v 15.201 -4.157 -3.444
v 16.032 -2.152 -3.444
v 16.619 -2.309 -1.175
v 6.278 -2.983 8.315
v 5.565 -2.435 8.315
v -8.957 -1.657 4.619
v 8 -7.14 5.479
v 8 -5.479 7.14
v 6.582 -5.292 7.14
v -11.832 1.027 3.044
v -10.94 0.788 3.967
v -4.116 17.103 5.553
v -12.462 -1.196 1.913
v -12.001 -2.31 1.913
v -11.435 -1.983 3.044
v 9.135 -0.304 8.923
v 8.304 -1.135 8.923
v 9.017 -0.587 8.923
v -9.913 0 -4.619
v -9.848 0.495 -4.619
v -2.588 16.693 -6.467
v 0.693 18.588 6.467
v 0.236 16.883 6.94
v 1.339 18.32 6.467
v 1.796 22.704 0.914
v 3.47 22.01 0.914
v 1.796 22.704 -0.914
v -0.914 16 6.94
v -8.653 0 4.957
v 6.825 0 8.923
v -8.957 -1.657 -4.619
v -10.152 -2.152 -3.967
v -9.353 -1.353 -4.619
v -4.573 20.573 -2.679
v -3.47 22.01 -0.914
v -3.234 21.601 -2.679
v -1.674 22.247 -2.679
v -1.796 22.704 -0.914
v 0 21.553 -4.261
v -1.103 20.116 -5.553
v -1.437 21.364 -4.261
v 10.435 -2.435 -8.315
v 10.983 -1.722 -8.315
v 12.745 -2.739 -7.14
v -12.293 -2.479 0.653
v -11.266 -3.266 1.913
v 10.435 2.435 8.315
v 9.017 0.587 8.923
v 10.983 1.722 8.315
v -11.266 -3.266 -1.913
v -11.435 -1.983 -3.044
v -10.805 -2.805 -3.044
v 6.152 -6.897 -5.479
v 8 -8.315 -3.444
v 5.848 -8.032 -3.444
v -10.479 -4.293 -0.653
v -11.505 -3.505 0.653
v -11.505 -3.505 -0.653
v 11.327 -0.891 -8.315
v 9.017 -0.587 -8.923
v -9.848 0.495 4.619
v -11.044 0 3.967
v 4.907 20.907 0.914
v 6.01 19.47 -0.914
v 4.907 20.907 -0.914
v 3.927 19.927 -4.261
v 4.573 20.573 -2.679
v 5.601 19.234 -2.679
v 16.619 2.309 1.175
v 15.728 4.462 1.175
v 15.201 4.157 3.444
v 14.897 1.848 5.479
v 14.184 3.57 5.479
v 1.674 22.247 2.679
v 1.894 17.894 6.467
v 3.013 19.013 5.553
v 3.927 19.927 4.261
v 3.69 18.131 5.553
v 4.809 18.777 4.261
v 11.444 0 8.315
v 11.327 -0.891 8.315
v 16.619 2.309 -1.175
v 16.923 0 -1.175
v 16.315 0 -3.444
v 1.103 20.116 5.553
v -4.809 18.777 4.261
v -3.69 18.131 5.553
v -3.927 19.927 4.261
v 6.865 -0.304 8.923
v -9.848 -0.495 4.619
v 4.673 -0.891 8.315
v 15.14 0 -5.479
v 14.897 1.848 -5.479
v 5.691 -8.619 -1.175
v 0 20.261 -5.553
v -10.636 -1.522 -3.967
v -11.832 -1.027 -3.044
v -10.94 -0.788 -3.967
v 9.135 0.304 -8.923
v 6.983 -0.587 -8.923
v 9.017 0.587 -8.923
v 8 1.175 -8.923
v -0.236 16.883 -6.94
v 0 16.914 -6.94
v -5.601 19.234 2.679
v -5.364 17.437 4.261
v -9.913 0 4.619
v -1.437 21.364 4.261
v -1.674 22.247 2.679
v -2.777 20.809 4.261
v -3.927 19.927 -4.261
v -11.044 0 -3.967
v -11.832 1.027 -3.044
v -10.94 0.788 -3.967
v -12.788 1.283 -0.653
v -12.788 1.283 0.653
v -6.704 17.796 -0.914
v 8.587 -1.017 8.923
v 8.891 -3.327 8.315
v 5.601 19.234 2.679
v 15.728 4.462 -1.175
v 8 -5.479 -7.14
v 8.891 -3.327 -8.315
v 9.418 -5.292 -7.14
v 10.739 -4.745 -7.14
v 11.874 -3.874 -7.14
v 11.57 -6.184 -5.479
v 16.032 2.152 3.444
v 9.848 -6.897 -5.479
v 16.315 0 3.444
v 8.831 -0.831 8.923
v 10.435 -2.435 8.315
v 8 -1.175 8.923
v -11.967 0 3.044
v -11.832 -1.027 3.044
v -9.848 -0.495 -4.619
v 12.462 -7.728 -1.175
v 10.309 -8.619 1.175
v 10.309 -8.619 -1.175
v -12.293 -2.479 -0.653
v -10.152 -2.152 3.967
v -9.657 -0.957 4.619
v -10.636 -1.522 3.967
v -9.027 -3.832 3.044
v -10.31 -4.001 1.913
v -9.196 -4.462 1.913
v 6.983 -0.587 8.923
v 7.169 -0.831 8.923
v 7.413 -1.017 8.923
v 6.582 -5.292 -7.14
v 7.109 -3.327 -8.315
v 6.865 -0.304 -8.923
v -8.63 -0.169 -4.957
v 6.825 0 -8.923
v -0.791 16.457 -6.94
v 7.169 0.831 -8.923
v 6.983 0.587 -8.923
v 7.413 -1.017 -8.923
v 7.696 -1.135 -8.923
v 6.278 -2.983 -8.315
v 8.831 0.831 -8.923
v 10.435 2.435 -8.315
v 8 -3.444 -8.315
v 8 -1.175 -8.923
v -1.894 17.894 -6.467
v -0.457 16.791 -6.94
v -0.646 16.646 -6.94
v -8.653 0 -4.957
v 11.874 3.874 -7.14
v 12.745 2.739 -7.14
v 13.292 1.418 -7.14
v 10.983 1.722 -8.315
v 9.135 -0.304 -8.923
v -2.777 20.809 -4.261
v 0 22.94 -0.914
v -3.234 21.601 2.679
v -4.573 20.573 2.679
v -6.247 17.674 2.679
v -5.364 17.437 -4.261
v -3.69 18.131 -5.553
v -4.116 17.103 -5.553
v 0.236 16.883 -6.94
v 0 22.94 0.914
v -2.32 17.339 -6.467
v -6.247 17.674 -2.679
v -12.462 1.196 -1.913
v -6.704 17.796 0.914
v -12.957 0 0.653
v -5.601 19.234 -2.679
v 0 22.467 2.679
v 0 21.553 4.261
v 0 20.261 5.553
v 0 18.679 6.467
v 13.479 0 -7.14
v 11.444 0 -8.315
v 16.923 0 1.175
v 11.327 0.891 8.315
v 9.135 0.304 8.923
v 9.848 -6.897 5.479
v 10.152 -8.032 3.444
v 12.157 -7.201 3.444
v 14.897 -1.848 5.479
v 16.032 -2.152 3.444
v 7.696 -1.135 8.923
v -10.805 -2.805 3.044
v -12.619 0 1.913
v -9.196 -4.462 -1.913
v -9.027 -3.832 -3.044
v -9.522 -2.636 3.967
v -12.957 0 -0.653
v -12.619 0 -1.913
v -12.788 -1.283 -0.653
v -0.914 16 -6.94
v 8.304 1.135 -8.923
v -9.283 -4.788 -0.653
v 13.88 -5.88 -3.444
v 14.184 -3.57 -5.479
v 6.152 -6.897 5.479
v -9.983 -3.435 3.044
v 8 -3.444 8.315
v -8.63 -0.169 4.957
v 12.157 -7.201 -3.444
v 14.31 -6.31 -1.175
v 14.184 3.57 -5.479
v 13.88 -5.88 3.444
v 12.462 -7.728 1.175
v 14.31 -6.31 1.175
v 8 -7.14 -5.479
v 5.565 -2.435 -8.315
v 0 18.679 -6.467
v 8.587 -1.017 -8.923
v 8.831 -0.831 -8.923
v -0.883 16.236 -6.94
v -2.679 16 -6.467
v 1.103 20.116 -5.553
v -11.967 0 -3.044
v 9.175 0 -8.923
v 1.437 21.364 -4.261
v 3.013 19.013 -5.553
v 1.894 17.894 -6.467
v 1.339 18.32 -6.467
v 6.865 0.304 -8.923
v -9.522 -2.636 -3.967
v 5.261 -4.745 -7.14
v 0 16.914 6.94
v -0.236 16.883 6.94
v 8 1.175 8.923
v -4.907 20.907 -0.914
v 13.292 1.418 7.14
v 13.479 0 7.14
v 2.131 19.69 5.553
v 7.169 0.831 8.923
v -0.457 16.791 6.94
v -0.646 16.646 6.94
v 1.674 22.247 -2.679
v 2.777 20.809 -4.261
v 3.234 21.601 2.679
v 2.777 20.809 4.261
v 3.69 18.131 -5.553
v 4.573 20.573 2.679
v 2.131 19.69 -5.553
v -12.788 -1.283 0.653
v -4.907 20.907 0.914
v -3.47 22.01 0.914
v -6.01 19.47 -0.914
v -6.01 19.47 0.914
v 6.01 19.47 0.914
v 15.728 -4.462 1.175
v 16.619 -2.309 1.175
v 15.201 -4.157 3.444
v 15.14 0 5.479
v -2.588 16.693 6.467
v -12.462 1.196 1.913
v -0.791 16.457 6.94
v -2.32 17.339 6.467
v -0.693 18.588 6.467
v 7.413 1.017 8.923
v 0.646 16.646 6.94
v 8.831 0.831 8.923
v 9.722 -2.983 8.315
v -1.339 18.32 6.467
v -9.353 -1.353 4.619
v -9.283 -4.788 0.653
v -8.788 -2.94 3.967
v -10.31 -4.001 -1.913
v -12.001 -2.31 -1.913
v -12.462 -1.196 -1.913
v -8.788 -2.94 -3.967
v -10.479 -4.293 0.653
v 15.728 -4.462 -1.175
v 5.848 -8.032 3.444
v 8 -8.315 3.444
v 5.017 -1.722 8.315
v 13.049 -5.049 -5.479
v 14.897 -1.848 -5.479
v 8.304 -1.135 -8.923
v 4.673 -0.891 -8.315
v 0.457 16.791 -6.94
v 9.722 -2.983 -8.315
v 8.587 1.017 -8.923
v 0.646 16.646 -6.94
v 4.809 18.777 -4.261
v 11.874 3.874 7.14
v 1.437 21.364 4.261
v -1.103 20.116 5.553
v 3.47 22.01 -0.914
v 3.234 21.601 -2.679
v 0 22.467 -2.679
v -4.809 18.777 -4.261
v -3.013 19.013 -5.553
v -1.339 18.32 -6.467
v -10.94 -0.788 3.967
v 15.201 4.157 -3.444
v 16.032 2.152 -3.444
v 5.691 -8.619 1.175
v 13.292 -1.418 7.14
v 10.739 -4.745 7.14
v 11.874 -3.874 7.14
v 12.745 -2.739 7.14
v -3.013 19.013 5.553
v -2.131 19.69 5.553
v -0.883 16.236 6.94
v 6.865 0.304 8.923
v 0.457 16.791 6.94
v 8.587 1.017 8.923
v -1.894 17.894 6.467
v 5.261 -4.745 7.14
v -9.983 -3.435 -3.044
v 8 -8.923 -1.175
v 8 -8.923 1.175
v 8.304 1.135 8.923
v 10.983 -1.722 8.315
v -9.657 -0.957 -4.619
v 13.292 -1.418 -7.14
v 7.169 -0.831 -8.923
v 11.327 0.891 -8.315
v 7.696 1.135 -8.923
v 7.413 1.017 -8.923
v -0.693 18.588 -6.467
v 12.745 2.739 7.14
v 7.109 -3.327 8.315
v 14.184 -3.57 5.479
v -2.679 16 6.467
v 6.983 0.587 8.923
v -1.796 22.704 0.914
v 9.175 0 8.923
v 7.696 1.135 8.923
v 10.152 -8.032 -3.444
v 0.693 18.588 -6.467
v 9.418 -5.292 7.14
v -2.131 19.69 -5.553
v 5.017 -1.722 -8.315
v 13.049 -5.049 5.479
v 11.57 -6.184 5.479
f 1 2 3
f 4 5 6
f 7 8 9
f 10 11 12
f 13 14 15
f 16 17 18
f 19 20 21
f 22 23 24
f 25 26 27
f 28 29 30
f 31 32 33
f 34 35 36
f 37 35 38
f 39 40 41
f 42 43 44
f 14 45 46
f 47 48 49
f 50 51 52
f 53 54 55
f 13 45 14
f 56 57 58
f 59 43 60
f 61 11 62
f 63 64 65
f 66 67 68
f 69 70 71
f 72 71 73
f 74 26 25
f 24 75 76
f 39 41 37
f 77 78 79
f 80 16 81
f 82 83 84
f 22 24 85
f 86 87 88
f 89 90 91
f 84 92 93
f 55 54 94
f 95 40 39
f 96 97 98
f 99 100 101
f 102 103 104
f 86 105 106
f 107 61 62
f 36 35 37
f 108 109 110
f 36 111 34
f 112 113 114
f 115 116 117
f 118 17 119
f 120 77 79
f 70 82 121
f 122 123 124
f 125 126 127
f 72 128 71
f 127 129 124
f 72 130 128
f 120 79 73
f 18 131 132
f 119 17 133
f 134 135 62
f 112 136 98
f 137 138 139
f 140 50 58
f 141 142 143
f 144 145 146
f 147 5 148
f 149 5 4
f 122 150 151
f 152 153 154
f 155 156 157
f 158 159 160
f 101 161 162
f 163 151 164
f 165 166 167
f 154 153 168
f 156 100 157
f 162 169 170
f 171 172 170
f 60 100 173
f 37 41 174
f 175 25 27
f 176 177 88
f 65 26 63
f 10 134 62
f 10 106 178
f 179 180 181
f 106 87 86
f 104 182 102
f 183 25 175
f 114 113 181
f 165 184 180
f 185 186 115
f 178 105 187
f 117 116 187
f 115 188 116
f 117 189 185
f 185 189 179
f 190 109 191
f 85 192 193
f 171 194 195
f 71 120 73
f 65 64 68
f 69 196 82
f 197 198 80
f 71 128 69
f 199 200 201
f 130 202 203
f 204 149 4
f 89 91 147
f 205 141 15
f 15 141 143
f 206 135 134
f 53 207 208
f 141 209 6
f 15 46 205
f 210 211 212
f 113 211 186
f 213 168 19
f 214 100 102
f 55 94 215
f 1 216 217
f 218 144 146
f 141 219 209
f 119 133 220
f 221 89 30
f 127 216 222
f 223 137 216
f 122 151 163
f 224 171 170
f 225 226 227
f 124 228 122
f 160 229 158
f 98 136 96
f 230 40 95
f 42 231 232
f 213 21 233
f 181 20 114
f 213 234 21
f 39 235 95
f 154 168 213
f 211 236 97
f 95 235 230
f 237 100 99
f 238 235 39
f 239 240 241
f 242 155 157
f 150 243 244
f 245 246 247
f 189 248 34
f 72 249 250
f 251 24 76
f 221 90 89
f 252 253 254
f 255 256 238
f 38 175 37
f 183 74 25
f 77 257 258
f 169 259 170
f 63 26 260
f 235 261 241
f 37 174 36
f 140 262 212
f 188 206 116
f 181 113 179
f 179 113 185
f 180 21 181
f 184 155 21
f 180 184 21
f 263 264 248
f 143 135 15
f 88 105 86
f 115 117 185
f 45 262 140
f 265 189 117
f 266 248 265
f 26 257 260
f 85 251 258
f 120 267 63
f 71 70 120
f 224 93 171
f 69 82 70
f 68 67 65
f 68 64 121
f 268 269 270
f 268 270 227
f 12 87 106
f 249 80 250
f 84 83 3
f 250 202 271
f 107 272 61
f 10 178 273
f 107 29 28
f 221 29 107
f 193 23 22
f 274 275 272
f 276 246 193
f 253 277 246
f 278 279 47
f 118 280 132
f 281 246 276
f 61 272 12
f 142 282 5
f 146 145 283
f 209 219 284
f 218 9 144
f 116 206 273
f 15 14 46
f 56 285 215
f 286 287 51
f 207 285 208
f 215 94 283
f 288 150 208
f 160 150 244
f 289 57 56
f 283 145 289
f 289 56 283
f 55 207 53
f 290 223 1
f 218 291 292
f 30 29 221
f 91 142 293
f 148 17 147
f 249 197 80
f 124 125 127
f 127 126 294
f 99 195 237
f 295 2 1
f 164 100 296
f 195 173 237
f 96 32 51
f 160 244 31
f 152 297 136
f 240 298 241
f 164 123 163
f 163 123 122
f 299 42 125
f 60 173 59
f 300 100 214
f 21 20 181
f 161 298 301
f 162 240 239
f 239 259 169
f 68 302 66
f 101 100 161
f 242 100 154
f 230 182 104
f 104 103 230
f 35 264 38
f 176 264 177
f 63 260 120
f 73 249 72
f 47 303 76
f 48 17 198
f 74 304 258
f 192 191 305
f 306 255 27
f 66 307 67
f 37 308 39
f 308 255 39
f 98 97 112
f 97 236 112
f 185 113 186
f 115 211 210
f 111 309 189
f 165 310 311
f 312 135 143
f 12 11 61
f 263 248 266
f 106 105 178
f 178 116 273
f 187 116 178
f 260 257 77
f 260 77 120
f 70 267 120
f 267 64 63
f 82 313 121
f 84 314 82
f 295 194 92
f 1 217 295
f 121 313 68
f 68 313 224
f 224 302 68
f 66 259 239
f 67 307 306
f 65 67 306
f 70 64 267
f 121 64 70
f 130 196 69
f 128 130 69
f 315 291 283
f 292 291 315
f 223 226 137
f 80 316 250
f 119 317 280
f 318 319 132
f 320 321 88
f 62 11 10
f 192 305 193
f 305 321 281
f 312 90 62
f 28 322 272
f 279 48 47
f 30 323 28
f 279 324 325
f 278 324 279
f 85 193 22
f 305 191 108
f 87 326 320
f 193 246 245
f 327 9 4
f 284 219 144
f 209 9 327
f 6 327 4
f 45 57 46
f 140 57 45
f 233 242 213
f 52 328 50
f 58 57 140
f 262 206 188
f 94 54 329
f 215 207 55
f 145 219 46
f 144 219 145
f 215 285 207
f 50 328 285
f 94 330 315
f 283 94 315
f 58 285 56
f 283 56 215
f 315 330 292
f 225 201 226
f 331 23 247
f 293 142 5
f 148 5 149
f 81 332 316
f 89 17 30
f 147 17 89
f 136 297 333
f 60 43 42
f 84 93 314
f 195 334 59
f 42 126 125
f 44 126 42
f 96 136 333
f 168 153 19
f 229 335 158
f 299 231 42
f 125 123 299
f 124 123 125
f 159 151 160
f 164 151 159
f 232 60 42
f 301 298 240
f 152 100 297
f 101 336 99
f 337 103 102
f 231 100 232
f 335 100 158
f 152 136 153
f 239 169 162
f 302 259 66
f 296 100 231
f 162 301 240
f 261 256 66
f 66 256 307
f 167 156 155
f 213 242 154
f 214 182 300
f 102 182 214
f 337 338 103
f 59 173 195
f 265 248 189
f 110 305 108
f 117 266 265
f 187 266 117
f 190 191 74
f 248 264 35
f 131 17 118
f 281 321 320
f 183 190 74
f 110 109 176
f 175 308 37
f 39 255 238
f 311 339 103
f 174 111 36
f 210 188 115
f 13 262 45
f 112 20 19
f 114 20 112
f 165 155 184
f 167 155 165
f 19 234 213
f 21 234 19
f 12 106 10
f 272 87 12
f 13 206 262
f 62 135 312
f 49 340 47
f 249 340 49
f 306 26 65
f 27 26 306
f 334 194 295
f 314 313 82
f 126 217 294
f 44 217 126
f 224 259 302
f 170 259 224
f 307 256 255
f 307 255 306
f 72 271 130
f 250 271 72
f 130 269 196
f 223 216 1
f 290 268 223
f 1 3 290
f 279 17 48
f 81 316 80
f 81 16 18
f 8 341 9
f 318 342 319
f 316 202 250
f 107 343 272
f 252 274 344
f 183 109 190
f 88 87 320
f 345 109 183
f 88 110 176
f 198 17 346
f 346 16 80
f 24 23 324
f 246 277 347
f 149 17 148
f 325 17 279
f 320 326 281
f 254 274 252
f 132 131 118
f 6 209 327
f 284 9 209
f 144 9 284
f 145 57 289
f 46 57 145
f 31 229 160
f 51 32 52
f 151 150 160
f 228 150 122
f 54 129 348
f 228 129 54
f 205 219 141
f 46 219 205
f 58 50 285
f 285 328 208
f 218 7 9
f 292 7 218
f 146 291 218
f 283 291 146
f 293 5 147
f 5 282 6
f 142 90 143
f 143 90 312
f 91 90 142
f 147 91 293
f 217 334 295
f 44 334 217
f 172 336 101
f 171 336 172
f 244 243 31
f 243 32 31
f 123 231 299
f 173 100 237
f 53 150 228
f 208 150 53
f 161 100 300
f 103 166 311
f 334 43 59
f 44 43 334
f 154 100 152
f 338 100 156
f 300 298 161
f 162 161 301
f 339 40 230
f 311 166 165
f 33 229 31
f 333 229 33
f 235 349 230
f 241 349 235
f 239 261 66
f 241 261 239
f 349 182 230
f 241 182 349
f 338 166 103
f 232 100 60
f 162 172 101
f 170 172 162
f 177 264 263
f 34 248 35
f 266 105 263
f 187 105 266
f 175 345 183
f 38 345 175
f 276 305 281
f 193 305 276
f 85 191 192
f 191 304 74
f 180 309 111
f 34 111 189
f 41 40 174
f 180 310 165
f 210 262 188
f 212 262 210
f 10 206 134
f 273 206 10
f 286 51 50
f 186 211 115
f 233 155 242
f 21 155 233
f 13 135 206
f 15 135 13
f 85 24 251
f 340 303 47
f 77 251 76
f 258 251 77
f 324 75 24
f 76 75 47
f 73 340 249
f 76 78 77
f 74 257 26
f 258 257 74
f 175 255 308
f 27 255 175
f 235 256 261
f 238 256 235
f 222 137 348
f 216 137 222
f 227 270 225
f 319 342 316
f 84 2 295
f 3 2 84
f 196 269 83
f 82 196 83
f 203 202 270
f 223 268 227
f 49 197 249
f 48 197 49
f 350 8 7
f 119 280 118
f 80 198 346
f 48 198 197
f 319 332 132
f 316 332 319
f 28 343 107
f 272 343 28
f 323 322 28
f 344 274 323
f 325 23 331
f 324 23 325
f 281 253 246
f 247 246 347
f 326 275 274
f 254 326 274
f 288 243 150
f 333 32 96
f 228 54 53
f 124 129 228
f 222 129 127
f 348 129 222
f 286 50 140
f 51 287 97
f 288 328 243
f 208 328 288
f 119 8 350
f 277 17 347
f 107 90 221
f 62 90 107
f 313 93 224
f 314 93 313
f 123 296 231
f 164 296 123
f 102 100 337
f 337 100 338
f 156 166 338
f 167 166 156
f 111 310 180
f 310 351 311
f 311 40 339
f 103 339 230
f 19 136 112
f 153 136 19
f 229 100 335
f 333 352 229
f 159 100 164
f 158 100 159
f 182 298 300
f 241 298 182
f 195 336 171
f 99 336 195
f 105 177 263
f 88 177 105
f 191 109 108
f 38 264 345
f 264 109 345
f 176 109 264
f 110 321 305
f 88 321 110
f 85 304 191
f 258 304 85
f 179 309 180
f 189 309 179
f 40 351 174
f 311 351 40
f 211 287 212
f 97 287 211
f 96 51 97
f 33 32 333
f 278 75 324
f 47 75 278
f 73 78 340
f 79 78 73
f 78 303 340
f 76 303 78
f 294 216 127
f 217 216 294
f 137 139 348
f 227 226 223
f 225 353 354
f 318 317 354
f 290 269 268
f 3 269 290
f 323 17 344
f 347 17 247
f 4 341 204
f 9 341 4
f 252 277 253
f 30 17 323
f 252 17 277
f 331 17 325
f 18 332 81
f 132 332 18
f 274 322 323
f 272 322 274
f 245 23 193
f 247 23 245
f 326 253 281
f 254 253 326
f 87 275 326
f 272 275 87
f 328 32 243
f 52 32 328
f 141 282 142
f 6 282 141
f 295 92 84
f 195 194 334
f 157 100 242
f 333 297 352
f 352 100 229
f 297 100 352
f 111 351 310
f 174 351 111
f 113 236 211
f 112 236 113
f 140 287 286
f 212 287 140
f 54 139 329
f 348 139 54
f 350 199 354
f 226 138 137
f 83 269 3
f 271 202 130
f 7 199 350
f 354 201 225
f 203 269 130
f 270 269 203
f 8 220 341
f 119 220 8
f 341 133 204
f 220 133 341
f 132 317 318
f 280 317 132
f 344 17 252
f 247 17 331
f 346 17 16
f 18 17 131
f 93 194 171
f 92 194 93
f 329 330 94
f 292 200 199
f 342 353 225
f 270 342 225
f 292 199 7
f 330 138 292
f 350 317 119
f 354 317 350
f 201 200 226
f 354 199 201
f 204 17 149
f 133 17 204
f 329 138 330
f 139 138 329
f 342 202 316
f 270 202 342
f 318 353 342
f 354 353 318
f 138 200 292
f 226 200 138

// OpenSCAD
$fn = 24;
hull() {
    translate([-8, 0, 0]) sphere(r = 5);
    translate([8, 0, 0]) sphere(r = 9);
    translate([0, 16, 0]) sphere(r = 7);
}
